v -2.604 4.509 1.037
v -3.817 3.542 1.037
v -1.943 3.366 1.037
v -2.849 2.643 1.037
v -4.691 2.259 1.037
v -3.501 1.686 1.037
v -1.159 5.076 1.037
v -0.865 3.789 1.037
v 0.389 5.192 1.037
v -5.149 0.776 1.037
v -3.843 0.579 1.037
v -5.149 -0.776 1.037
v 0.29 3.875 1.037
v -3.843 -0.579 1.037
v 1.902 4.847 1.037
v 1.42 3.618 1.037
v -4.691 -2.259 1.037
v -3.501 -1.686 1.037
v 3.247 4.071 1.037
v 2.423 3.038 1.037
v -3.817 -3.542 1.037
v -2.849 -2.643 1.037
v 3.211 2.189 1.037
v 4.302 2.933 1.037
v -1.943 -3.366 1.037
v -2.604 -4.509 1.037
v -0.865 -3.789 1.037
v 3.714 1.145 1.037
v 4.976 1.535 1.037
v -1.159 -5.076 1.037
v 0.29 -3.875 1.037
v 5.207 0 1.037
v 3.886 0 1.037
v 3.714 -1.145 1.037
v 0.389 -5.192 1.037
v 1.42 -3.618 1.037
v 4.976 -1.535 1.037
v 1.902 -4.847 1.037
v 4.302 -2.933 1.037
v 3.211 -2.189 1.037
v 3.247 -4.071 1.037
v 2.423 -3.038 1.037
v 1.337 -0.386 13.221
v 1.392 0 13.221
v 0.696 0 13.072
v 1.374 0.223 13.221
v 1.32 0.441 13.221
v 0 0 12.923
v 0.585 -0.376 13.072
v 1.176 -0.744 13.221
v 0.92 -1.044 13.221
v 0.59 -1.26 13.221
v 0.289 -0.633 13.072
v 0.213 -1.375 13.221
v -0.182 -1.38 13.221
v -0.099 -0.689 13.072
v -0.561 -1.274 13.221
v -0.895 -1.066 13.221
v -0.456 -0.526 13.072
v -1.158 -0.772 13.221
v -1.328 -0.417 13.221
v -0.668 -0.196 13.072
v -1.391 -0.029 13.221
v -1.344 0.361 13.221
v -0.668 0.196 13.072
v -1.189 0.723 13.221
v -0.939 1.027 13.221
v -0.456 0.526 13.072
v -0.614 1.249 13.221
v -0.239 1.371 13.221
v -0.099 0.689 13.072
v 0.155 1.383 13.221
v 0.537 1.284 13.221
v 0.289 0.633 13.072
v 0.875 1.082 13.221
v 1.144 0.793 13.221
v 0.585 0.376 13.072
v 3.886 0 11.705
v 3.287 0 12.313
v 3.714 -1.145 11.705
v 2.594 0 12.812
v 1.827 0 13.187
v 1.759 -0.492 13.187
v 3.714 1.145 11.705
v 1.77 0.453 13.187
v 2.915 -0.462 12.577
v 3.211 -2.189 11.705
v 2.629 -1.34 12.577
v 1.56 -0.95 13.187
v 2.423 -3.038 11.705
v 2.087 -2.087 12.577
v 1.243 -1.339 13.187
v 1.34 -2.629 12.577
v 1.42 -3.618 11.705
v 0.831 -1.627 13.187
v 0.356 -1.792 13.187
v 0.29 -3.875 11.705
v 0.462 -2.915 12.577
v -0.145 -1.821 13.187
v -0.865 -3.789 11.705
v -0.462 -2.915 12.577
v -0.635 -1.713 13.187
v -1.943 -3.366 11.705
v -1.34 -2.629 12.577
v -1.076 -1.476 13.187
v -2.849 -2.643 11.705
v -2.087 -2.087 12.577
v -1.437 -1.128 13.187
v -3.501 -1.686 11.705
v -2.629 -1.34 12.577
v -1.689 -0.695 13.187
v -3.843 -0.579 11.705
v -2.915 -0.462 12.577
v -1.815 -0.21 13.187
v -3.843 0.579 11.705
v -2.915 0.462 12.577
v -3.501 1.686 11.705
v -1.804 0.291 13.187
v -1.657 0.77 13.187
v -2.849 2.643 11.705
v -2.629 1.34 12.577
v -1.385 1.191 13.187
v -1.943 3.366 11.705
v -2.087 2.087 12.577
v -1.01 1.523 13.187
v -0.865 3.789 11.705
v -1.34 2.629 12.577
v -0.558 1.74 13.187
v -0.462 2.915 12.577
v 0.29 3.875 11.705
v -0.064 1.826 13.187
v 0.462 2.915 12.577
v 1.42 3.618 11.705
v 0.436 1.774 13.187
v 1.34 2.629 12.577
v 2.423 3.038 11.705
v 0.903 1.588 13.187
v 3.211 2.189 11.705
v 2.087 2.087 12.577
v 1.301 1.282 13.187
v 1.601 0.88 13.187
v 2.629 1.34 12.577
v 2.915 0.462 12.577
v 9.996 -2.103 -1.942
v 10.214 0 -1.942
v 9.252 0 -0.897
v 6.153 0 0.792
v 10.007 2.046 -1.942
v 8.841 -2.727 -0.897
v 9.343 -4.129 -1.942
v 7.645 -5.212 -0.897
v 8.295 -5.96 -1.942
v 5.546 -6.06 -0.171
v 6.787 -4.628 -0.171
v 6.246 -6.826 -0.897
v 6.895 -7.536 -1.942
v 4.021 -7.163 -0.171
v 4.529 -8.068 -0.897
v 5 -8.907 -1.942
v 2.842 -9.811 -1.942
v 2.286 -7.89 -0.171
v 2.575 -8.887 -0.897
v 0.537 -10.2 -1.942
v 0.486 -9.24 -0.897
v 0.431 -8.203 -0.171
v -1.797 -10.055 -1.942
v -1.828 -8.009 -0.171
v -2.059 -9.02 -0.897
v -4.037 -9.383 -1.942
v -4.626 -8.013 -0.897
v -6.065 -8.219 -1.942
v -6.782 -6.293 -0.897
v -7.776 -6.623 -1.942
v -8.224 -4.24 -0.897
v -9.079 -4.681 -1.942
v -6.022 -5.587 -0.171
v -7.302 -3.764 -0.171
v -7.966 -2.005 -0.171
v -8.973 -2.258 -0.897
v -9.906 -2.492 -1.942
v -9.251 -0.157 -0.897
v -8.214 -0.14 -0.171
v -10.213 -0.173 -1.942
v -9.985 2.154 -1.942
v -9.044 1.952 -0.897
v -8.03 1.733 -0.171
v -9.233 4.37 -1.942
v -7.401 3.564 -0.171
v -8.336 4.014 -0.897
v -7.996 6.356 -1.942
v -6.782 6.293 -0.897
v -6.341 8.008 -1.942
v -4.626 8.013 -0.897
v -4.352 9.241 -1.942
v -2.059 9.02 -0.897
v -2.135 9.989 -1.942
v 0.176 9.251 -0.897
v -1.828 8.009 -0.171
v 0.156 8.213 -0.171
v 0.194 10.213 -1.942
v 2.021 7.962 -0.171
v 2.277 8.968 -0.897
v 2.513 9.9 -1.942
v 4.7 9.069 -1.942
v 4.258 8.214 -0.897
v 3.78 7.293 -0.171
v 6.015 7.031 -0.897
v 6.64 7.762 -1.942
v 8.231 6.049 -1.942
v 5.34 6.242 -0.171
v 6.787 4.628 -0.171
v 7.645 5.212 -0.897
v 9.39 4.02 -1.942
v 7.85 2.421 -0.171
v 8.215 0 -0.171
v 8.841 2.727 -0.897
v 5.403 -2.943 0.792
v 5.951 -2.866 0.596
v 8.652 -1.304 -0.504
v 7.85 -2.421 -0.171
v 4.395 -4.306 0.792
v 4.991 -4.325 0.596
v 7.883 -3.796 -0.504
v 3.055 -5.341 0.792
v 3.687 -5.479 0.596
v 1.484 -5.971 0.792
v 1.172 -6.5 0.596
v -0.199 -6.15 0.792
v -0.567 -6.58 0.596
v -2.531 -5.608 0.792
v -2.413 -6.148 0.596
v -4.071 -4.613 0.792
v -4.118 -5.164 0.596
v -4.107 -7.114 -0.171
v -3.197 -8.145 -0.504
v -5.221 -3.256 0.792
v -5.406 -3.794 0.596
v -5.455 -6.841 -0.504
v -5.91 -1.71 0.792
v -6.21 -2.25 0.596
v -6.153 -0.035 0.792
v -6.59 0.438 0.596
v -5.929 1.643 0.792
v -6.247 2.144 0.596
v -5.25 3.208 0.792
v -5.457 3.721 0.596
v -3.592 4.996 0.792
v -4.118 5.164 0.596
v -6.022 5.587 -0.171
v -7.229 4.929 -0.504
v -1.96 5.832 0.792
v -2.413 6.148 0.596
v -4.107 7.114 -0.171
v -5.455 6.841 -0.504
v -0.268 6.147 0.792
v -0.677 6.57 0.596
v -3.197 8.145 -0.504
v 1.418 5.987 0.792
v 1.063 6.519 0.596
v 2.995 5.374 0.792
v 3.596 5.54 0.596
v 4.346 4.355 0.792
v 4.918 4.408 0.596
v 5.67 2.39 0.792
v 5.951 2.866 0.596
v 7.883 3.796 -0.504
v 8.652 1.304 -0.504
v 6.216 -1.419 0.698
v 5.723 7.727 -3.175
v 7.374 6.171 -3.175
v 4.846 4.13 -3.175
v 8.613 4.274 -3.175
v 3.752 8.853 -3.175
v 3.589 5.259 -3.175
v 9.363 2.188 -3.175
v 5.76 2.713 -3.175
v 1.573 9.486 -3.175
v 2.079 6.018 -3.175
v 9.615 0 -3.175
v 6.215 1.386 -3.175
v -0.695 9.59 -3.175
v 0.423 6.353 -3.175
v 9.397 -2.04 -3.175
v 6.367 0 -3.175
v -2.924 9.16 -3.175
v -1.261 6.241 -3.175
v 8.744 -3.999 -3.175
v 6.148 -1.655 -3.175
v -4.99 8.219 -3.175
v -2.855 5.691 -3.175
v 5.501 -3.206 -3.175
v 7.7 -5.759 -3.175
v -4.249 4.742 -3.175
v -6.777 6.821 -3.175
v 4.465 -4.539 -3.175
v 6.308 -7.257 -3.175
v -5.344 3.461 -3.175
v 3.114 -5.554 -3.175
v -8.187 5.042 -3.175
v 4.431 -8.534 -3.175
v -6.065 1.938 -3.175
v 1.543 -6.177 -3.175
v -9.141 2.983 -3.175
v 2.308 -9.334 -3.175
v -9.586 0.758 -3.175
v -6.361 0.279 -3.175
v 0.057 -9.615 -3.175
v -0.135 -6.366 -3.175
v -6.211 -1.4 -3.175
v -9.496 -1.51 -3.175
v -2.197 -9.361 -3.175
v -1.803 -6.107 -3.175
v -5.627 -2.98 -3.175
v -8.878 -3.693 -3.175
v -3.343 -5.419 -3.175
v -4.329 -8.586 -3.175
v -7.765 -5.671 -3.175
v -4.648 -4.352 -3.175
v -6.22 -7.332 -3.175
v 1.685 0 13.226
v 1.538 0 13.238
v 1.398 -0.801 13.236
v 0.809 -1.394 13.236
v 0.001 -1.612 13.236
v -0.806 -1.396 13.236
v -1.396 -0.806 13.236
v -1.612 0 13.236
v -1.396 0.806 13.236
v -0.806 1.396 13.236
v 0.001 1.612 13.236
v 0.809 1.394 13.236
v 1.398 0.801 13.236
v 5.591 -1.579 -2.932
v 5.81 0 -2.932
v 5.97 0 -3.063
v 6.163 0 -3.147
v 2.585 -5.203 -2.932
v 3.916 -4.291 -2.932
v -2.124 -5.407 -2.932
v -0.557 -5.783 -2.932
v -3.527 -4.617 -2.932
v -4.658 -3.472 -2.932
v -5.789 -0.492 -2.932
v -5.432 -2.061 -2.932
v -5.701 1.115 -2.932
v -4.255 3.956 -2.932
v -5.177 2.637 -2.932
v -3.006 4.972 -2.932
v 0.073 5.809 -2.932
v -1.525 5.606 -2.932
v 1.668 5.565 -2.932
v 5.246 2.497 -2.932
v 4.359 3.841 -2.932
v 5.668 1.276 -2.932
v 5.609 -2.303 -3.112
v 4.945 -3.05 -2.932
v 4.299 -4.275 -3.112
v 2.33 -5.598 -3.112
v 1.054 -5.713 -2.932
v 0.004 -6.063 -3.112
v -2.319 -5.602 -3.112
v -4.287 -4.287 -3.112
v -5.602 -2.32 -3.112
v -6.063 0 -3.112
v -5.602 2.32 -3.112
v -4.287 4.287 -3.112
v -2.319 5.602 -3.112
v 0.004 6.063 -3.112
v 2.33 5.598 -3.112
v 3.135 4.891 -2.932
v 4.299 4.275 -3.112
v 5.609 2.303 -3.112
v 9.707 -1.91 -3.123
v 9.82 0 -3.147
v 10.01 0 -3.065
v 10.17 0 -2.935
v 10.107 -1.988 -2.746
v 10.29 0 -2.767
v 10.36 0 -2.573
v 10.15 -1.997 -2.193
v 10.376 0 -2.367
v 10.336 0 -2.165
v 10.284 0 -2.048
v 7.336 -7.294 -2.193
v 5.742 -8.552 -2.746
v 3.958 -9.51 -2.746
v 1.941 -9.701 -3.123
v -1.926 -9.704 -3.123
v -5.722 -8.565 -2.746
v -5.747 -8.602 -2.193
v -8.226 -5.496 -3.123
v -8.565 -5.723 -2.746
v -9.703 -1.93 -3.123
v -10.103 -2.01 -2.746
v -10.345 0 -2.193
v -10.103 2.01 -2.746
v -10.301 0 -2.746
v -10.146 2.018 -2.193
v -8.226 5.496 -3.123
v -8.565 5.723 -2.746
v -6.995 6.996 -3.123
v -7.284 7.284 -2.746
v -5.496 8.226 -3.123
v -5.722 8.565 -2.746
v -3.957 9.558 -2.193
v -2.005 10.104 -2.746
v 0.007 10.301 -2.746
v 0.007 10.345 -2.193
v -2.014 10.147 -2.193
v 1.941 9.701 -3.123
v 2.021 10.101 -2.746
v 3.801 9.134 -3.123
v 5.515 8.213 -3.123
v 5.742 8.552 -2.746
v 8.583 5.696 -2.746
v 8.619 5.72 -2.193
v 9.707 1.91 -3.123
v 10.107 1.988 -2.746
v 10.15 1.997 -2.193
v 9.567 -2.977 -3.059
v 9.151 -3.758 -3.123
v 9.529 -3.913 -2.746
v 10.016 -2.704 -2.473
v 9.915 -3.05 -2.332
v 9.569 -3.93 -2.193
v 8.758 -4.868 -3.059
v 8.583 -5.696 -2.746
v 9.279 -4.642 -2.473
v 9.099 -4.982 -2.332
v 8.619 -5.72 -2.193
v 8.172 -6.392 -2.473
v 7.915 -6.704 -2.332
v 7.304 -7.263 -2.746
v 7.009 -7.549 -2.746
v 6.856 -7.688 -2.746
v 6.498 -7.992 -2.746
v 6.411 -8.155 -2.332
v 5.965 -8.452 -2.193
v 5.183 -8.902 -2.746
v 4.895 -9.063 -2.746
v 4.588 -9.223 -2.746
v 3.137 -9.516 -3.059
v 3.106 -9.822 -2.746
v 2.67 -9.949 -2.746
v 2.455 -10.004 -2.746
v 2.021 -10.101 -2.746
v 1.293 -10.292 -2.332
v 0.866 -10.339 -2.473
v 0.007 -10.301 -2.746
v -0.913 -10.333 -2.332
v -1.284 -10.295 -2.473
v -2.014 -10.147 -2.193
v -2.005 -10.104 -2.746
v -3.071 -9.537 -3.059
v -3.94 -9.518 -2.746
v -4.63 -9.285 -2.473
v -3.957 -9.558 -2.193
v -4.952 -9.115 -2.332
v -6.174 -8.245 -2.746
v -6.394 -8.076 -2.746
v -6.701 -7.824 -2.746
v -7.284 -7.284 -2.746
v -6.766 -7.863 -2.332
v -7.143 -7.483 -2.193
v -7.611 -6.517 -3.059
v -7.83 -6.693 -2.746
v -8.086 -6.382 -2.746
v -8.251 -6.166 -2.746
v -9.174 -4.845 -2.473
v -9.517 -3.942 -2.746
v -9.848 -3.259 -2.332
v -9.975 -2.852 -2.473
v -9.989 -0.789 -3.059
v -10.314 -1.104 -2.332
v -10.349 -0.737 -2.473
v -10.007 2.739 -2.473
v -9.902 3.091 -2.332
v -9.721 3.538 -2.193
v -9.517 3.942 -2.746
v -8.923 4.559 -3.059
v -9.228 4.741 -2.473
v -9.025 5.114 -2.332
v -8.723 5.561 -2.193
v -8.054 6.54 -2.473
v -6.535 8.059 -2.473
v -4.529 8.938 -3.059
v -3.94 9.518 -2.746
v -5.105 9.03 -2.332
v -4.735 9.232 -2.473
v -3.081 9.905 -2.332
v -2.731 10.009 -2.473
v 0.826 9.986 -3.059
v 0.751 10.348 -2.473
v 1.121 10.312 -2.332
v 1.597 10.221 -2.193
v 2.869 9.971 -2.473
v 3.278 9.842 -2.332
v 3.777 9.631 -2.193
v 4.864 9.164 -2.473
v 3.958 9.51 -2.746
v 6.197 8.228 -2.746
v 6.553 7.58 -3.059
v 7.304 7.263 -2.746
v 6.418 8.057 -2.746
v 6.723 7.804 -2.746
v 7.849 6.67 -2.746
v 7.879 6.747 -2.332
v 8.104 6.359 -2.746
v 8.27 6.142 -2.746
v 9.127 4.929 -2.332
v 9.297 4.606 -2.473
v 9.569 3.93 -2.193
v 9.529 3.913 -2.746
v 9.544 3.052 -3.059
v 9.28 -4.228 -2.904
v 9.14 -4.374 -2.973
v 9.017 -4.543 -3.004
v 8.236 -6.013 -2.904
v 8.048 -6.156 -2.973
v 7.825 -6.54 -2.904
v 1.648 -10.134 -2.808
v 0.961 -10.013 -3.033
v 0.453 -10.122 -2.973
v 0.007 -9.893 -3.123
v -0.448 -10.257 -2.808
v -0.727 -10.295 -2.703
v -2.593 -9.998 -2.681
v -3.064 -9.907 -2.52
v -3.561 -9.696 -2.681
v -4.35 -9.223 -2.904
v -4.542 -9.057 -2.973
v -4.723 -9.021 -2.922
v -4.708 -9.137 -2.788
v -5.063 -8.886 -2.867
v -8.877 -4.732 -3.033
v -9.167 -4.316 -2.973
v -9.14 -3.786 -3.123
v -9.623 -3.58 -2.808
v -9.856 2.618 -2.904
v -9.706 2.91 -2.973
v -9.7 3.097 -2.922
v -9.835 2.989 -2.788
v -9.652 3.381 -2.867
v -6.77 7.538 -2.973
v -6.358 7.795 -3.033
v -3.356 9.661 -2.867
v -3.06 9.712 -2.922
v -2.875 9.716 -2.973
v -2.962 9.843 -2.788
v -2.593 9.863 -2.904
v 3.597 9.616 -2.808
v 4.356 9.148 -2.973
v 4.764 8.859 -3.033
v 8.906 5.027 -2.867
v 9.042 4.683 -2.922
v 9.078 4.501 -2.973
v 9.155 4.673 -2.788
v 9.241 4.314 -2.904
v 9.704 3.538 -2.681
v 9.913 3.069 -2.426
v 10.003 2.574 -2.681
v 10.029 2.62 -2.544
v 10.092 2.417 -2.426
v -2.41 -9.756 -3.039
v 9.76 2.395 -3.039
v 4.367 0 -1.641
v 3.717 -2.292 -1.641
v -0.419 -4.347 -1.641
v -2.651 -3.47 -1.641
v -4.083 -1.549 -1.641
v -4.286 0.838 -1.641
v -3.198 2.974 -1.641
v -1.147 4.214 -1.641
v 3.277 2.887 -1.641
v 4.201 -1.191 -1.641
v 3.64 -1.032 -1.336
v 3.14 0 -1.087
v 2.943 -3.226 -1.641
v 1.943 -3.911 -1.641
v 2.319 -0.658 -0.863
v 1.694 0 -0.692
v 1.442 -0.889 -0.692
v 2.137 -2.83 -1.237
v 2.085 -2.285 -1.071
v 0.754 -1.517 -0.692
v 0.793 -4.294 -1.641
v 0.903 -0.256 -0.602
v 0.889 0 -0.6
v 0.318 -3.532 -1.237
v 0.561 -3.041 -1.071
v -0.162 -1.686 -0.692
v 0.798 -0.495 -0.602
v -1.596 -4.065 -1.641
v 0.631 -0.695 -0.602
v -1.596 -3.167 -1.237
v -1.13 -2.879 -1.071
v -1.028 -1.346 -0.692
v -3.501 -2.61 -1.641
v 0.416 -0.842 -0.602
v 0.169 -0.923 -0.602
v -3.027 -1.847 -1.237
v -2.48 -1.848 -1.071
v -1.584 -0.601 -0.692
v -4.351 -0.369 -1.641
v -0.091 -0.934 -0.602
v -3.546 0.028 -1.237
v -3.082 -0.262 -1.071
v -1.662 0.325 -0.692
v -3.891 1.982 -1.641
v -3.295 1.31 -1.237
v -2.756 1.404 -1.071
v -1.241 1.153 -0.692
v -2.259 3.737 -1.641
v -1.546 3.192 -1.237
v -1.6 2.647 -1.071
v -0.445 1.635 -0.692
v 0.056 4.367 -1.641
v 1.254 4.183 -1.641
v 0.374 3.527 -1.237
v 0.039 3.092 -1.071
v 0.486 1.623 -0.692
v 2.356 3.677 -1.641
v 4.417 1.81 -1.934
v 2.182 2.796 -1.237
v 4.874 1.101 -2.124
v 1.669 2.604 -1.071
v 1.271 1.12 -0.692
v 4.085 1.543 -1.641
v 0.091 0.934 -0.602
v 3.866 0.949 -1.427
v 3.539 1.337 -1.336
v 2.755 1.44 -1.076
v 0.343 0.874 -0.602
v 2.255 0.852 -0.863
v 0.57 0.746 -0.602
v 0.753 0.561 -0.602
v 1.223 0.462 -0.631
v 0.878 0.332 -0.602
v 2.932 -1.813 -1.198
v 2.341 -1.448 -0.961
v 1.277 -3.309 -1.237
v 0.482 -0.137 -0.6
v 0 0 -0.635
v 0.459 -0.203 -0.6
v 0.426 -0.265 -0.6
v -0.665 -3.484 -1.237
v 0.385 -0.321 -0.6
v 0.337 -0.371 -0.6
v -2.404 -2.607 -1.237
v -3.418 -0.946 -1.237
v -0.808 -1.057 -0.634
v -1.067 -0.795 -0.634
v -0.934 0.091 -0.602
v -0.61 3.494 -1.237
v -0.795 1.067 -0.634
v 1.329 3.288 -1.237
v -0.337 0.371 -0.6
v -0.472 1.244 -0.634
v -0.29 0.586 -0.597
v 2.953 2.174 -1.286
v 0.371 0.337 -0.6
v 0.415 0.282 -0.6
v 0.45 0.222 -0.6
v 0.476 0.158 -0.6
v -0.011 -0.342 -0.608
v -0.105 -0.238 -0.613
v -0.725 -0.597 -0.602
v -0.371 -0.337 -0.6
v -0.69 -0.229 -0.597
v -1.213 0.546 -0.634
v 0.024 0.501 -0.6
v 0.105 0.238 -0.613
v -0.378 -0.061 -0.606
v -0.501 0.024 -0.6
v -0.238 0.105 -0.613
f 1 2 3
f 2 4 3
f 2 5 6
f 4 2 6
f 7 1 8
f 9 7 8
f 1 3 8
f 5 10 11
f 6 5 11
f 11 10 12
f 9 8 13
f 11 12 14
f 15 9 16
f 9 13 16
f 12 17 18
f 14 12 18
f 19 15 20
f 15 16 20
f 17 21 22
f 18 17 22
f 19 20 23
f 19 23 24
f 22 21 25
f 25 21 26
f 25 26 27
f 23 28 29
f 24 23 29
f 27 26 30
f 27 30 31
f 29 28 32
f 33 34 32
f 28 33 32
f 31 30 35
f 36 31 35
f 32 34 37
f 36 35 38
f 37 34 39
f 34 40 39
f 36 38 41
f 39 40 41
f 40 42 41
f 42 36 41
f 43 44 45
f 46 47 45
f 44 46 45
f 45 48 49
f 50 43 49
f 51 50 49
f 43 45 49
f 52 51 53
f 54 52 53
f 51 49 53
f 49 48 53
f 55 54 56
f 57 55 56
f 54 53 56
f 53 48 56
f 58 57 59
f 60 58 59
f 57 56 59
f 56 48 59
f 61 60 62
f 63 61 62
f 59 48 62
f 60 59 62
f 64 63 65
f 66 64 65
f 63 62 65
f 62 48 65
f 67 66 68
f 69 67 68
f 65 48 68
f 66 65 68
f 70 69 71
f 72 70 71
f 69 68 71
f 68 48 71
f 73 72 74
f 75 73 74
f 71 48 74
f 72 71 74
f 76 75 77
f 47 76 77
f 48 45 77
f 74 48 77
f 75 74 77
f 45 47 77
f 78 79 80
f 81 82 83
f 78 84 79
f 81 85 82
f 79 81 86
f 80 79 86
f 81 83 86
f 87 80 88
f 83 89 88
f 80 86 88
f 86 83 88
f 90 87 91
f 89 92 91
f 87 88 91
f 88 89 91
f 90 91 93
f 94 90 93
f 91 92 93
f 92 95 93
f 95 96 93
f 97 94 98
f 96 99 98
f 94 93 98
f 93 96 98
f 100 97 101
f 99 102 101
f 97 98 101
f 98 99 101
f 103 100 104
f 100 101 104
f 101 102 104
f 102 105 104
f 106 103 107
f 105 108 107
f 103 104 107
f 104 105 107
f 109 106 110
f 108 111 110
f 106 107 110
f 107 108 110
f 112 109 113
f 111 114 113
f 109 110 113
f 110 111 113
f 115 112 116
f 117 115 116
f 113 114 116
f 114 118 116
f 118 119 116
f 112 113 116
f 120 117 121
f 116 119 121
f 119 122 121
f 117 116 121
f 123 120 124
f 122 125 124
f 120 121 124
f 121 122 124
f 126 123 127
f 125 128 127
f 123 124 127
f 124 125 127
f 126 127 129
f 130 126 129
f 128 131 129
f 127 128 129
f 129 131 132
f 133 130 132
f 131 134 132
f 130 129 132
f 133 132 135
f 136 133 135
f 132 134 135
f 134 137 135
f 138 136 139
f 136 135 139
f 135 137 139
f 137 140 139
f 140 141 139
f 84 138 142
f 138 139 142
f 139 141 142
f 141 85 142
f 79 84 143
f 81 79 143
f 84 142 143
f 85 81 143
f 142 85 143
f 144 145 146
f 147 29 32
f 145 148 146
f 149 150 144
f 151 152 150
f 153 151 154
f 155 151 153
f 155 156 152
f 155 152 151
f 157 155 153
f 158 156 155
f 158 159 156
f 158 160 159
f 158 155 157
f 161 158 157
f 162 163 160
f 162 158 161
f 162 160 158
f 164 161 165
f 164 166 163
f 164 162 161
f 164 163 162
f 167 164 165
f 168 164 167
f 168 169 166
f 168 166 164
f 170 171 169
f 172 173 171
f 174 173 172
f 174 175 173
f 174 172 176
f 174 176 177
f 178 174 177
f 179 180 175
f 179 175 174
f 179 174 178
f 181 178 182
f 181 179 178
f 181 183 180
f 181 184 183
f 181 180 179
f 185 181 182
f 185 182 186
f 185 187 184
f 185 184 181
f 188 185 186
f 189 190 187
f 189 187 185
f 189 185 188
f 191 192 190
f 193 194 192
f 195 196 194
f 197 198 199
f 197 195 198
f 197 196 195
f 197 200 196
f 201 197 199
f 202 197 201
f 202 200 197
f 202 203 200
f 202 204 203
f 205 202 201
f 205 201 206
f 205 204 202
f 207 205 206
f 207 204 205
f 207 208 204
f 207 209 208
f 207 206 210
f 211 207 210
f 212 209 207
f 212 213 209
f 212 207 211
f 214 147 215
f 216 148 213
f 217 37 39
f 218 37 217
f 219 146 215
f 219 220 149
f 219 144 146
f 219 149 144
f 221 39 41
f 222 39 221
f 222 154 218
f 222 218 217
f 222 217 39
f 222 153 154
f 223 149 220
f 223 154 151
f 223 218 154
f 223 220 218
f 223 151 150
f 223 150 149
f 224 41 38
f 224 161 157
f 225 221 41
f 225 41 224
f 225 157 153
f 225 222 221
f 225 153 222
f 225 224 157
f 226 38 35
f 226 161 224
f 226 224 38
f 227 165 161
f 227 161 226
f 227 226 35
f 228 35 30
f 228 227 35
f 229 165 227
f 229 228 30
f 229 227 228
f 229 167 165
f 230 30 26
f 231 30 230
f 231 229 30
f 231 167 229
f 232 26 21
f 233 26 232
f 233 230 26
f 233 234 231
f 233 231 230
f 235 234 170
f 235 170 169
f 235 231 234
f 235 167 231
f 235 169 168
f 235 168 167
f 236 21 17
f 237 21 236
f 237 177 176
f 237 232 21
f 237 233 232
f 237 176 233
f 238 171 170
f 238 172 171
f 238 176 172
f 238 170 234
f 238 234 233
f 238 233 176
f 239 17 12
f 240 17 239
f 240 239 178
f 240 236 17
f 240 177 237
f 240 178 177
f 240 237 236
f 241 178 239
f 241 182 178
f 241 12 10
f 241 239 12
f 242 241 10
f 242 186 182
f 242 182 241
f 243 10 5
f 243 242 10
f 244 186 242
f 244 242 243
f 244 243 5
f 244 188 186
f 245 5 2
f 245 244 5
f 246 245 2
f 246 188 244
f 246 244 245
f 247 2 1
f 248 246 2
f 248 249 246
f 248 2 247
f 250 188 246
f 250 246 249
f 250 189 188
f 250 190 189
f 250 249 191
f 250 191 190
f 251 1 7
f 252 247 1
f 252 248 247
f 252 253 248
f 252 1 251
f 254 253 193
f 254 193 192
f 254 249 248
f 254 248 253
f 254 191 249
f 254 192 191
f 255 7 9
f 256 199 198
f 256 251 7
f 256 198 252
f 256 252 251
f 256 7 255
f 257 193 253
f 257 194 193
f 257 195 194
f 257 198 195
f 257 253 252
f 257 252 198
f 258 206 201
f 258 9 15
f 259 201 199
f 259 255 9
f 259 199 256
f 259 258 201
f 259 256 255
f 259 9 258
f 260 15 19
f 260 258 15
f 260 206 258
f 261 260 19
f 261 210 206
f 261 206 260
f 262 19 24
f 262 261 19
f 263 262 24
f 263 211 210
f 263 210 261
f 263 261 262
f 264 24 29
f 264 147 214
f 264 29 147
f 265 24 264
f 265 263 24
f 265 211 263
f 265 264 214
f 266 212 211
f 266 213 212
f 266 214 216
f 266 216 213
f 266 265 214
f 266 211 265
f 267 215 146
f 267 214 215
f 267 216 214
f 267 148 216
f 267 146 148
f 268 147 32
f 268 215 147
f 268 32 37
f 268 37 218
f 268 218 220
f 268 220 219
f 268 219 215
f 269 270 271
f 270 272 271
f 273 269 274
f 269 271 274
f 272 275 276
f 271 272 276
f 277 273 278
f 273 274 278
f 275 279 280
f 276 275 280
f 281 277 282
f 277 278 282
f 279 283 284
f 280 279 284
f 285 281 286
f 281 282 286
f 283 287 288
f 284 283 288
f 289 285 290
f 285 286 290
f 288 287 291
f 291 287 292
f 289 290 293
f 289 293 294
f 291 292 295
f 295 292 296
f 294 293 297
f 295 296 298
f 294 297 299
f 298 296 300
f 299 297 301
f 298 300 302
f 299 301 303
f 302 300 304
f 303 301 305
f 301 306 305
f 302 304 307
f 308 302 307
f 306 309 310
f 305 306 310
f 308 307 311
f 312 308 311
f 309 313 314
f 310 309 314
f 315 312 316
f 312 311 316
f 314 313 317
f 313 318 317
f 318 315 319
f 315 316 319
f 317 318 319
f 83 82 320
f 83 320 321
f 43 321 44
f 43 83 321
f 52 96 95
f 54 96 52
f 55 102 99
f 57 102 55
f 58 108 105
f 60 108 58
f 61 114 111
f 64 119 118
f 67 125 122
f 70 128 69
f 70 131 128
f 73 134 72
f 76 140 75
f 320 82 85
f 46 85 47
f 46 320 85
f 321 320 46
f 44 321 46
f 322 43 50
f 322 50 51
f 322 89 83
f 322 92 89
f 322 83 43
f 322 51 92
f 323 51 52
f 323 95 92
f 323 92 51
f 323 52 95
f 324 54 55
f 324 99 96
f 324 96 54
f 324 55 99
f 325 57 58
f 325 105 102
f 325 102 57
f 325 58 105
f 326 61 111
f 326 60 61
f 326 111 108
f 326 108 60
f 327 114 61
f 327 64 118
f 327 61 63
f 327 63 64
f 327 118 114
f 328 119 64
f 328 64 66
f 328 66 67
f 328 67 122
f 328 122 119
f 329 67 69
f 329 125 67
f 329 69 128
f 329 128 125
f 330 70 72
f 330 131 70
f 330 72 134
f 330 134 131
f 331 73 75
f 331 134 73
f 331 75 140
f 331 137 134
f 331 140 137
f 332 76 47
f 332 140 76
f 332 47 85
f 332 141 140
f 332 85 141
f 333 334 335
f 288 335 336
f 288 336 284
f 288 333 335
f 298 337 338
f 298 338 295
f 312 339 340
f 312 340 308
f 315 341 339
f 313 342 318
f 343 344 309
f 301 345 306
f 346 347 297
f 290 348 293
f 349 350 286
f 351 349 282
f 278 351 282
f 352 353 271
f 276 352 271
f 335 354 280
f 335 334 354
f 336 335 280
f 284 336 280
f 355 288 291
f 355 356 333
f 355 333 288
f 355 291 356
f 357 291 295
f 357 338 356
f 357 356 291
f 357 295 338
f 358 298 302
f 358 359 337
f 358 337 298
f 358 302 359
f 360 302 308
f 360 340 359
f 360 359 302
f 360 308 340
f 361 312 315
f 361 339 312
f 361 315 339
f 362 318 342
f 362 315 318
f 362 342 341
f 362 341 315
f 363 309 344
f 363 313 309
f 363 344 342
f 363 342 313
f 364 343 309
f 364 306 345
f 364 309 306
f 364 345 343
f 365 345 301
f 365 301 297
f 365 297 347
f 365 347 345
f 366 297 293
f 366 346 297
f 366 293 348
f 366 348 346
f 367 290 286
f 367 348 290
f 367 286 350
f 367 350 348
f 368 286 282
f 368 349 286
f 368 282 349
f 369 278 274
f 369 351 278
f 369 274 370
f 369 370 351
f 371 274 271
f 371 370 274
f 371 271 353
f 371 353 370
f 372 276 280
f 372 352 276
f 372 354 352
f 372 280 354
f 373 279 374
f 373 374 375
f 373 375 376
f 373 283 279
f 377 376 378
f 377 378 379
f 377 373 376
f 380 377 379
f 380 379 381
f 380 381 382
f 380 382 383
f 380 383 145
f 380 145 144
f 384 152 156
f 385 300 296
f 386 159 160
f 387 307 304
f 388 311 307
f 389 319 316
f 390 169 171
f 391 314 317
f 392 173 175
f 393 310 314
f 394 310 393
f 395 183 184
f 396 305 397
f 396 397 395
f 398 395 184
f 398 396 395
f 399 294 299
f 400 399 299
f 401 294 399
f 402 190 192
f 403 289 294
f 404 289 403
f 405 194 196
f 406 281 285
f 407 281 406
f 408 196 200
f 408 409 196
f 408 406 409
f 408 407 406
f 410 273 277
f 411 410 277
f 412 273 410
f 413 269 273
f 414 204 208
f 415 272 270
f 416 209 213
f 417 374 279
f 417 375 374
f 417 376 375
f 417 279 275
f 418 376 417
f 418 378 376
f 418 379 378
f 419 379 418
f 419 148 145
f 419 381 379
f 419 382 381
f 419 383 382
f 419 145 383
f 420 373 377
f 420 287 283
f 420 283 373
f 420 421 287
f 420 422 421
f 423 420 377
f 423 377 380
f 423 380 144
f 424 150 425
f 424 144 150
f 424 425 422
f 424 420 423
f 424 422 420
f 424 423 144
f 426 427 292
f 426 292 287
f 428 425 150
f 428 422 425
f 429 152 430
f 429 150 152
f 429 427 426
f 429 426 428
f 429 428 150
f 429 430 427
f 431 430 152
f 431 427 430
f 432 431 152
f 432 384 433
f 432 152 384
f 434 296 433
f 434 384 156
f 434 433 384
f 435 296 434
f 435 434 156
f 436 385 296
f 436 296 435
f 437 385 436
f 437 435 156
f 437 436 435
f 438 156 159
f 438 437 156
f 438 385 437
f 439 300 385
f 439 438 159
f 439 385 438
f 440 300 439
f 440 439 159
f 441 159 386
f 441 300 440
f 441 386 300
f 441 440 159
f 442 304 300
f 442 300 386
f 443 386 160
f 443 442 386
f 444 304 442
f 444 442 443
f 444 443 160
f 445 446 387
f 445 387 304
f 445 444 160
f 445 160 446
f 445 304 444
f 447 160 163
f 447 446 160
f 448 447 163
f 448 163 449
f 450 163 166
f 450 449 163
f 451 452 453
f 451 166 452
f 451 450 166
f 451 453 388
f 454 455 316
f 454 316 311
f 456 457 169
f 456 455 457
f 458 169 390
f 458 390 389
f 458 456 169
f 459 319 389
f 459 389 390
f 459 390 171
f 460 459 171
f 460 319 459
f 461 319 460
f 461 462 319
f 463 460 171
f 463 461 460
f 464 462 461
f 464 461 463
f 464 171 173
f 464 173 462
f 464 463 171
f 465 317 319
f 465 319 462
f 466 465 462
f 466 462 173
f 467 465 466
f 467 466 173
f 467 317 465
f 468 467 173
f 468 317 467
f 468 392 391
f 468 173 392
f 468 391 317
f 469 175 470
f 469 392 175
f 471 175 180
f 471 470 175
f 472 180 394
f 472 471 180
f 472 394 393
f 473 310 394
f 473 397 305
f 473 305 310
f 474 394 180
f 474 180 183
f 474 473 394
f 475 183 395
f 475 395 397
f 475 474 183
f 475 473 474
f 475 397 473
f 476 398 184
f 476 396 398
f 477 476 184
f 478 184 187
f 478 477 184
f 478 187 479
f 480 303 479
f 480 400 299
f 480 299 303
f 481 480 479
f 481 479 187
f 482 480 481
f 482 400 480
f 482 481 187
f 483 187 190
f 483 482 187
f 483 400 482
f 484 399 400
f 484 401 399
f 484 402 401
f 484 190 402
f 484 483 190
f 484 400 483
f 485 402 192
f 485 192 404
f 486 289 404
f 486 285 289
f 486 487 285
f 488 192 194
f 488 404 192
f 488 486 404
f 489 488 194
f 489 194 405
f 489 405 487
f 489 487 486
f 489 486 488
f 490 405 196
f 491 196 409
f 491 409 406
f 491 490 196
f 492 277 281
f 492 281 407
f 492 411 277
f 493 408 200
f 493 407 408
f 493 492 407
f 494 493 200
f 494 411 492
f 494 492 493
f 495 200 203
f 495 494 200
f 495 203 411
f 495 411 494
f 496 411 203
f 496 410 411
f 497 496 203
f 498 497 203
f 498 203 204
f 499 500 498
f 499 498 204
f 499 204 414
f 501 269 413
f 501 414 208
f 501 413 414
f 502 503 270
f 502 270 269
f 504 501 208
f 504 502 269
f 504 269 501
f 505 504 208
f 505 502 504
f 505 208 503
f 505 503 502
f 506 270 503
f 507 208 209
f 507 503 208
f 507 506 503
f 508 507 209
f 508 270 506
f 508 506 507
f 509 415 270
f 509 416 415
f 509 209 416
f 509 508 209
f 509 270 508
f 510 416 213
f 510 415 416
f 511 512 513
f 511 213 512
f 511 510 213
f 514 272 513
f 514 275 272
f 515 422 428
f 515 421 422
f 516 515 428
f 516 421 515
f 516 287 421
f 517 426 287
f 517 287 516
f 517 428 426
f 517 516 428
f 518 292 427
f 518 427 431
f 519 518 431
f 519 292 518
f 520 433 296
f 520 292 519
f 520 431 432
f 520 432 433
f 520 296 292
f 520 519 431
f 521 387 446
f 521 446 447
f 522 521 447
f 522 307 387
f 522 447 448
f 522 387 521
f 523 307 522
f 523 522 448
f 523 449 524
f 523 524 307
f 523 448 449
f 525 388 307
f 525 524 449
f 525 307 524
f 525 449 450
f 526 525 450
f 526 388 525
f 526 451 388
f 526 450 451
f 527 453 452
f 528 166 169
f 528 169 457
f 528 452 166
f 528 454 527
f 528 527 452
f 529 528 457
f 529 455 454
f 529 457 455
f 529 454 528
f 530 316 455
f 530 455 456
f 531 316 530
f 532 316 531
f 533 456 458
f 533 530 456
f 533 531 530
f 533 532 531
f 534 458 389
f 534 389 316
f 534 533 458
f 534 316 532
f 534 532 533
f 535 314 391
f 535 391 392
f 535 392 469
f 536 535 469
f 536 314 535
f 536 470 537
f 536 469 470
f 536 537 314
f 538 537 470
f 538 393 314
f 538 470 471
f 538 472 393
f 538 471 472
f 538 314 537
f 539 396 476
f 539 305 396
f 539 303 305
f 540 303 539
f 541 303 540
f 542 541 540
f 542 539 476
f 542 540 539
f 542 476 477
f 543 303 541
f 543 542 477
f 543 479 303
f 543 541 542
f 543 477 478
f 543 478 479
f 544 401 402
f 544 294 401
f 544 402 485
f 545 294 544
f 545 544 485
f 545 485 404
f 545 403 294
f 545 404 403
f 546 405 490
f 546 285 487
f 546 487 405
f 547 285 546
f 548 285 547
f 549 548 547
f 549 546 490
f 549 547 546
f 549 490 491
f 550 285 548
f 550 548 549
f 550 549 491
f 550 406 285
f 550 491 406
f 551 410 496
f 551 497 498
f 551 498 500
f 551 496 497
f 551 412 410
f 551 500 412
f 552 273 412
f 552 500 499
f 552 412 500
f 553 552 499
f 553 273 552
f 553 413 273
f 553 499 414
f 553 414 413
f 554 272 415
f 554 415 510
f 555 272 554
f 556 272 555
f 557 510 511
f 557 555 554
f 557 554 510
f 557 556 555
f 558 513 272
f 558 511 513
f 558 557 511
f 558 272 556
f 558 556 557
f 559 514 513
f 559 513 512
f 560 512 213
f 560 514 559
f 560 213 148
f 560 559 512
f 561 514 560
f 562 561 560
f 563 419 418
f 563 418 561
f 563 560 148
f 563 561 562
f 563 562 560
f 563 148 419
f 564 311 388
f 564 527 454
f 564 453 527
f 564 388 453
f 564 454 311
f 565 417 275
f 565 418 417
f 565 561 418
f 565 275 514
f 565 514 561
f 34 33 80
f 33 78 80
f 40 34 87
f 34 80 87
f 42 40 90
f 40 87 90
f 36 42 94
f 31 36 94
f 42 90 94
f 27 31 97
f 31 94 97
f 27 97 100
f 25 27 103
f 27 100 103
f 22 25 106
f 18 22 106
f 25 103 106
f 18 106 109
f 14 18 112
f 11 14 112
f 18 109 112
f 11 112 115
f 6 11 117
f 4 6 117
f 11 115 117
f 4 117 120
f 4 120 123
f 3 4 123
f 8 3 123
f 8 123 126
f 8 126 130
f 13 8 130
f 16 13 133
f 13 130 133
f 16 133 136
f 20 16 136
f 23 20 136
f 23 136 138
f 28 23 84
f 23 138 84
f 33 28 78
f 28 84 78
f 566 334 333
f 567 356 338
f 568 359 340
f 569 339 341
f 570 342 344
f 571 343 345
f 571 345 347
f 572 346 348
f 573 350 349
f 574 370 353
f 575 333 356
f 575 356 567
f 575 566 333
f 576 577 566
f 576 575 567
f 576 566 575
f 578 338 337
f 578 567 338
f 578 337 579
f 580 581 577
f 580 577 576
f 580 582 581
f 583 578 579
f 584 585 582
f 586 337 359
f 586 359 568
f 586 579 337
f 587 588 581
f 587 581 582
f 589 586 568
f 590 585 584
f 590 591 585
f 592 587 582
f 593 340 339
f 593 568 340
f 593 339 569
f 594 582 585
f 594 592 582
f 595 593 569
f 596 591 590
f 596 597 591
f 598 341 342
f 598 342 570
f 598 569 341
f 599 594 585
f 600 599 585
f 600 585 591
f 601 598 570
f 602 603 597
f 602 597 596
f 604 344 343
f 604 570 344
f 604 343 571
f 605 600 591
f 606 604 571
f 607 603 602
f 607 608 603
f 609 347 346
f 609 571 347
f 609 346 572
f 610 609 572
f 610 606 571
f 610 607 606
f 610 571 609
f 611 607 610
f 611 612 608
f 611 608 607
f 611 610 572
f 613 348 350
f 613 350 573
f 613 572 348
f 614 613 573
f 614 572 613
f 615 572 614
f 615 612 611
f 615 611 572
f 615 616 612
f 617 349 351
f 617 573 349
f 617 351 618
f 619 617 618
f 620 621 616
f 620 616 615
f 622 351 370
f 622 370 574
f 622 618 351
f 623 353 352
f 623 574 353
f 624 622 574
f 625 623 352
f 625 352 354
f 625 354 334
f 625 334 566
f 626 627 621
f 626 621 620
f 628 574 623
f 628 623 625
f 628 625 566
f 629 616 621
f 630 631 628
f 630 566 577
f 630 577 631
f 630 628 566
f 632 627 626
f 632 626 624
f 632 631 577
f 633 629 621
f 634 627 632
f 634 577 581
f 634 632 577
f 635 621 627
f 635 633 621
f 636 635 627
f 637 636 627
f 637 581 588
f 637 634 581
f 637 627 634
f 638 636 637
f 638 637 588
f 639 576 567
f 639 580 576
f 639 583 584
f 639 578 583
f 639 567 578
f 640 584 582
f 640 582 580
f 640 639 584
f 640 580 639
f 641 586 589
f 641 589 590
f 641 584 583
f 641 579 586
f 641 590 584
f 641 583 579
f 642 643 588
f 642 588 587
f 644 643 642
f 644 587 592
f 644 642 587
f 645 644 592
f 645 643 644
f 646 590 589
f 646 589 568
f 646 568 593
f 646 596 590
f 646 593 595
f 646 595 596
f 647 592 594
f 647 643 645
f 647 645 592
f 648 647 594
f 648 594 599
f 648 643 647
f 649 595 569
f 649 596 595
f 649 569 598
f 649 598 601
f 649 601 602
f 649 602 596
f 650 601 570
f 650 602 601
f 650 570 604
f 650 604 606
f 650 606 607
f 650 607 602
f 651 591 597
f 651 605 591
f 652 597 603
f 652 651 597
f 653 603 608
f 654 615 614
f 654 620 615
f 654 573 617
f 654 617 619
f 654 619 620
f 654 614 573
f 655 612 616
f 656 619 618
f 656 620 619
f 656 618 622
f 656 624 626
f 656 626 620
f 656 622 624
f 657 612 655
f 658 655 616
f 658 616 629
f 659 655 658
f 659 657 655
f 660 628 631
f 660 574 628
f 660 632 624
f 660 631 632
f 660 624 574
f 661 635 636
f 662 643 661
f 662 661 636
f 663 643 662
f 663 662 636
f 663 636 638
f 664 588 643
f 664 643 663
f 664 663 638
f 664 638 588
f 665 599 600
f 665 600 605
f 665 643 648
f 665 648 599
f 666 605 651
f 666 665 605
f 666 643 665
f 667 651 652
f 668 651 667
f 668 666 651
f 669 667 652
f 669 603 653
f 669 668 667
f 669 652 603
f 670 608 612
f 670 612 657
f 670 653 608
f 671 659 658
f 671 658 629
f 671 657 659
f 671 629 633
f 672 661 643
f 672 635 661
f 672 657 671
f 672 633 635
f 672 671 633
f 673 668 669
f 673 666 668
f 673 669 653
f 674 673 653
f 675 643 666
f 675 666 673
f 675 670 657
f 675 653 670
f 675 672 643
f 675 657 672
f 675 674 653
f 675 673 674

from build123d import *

# Parameters (mm, degrees)
F3_R = 0.762


# Not quite as in the source:
# - a feature names something its author has since deleted; it is built from what else it names


with BuildPart() as f2:
    # F0 (on Front) → F2 (revolve)
    with BuildSketch(Plane.XZ):
        with BuildLine():
            Line((3.8862, 1.0368246978), (3.8862, 11.7048246978))
            ThreePointArc((3.8862, 11.7048246978), (2.8543707216, 12.645076528), (1.6046219265, 13.2670677765))
            Line((1.6046219265, 13.2670677765), (0, 12.9230134189))
            Line((0, 12.9230134189), (0, -0.635))
            add(Edge.make_bspline(
                [(6.0325, -3.175), (4.927107133, -1.9561804365), (4.0449600812, -1.3553717475), (1.9983640724, -0.7115763161), (0.9248232606, -0.5421136513), (0, -0.635)],
                knots=[0, 0, 0, 0, 0.3804425123, 0.6767184943, 1, 1, 1, 1], degree=3))
            Line((6.0325, -3.175), (11.1125, -3.175))
            add(Edge.make_bspline(
                [(5.207, 1.0368246978), (5.7984997261, 0.975644811), (6.74291899, 0.5105425669), (9.2830121982, -0.5417734643), (10.4753485066, -2.2706511595), (11.1125, -3.175)],
                knots=[0, 0, 0, 0, 0.2725407329, 0.6170084006, 1, 1, 1, 1], degree=3))
            Line((5.207, 1.0368246978), (3.8862, 1.0368246978))
        make_face()
    revolve(axis=Axis((0, 0, 1.4091059566), (0, 0, -1)))

    # F3
    f3_edges = [f2.edges().sort_by_distance(p)[0] for p in [
        (-1.604622, 0, 13.267068),
        (-6.0325, 0, -3.175),
        (-11.1125, 0, -3.175),
    ]]
    fillet(f3_edges, radius=F3_R)


solid = f2.part
